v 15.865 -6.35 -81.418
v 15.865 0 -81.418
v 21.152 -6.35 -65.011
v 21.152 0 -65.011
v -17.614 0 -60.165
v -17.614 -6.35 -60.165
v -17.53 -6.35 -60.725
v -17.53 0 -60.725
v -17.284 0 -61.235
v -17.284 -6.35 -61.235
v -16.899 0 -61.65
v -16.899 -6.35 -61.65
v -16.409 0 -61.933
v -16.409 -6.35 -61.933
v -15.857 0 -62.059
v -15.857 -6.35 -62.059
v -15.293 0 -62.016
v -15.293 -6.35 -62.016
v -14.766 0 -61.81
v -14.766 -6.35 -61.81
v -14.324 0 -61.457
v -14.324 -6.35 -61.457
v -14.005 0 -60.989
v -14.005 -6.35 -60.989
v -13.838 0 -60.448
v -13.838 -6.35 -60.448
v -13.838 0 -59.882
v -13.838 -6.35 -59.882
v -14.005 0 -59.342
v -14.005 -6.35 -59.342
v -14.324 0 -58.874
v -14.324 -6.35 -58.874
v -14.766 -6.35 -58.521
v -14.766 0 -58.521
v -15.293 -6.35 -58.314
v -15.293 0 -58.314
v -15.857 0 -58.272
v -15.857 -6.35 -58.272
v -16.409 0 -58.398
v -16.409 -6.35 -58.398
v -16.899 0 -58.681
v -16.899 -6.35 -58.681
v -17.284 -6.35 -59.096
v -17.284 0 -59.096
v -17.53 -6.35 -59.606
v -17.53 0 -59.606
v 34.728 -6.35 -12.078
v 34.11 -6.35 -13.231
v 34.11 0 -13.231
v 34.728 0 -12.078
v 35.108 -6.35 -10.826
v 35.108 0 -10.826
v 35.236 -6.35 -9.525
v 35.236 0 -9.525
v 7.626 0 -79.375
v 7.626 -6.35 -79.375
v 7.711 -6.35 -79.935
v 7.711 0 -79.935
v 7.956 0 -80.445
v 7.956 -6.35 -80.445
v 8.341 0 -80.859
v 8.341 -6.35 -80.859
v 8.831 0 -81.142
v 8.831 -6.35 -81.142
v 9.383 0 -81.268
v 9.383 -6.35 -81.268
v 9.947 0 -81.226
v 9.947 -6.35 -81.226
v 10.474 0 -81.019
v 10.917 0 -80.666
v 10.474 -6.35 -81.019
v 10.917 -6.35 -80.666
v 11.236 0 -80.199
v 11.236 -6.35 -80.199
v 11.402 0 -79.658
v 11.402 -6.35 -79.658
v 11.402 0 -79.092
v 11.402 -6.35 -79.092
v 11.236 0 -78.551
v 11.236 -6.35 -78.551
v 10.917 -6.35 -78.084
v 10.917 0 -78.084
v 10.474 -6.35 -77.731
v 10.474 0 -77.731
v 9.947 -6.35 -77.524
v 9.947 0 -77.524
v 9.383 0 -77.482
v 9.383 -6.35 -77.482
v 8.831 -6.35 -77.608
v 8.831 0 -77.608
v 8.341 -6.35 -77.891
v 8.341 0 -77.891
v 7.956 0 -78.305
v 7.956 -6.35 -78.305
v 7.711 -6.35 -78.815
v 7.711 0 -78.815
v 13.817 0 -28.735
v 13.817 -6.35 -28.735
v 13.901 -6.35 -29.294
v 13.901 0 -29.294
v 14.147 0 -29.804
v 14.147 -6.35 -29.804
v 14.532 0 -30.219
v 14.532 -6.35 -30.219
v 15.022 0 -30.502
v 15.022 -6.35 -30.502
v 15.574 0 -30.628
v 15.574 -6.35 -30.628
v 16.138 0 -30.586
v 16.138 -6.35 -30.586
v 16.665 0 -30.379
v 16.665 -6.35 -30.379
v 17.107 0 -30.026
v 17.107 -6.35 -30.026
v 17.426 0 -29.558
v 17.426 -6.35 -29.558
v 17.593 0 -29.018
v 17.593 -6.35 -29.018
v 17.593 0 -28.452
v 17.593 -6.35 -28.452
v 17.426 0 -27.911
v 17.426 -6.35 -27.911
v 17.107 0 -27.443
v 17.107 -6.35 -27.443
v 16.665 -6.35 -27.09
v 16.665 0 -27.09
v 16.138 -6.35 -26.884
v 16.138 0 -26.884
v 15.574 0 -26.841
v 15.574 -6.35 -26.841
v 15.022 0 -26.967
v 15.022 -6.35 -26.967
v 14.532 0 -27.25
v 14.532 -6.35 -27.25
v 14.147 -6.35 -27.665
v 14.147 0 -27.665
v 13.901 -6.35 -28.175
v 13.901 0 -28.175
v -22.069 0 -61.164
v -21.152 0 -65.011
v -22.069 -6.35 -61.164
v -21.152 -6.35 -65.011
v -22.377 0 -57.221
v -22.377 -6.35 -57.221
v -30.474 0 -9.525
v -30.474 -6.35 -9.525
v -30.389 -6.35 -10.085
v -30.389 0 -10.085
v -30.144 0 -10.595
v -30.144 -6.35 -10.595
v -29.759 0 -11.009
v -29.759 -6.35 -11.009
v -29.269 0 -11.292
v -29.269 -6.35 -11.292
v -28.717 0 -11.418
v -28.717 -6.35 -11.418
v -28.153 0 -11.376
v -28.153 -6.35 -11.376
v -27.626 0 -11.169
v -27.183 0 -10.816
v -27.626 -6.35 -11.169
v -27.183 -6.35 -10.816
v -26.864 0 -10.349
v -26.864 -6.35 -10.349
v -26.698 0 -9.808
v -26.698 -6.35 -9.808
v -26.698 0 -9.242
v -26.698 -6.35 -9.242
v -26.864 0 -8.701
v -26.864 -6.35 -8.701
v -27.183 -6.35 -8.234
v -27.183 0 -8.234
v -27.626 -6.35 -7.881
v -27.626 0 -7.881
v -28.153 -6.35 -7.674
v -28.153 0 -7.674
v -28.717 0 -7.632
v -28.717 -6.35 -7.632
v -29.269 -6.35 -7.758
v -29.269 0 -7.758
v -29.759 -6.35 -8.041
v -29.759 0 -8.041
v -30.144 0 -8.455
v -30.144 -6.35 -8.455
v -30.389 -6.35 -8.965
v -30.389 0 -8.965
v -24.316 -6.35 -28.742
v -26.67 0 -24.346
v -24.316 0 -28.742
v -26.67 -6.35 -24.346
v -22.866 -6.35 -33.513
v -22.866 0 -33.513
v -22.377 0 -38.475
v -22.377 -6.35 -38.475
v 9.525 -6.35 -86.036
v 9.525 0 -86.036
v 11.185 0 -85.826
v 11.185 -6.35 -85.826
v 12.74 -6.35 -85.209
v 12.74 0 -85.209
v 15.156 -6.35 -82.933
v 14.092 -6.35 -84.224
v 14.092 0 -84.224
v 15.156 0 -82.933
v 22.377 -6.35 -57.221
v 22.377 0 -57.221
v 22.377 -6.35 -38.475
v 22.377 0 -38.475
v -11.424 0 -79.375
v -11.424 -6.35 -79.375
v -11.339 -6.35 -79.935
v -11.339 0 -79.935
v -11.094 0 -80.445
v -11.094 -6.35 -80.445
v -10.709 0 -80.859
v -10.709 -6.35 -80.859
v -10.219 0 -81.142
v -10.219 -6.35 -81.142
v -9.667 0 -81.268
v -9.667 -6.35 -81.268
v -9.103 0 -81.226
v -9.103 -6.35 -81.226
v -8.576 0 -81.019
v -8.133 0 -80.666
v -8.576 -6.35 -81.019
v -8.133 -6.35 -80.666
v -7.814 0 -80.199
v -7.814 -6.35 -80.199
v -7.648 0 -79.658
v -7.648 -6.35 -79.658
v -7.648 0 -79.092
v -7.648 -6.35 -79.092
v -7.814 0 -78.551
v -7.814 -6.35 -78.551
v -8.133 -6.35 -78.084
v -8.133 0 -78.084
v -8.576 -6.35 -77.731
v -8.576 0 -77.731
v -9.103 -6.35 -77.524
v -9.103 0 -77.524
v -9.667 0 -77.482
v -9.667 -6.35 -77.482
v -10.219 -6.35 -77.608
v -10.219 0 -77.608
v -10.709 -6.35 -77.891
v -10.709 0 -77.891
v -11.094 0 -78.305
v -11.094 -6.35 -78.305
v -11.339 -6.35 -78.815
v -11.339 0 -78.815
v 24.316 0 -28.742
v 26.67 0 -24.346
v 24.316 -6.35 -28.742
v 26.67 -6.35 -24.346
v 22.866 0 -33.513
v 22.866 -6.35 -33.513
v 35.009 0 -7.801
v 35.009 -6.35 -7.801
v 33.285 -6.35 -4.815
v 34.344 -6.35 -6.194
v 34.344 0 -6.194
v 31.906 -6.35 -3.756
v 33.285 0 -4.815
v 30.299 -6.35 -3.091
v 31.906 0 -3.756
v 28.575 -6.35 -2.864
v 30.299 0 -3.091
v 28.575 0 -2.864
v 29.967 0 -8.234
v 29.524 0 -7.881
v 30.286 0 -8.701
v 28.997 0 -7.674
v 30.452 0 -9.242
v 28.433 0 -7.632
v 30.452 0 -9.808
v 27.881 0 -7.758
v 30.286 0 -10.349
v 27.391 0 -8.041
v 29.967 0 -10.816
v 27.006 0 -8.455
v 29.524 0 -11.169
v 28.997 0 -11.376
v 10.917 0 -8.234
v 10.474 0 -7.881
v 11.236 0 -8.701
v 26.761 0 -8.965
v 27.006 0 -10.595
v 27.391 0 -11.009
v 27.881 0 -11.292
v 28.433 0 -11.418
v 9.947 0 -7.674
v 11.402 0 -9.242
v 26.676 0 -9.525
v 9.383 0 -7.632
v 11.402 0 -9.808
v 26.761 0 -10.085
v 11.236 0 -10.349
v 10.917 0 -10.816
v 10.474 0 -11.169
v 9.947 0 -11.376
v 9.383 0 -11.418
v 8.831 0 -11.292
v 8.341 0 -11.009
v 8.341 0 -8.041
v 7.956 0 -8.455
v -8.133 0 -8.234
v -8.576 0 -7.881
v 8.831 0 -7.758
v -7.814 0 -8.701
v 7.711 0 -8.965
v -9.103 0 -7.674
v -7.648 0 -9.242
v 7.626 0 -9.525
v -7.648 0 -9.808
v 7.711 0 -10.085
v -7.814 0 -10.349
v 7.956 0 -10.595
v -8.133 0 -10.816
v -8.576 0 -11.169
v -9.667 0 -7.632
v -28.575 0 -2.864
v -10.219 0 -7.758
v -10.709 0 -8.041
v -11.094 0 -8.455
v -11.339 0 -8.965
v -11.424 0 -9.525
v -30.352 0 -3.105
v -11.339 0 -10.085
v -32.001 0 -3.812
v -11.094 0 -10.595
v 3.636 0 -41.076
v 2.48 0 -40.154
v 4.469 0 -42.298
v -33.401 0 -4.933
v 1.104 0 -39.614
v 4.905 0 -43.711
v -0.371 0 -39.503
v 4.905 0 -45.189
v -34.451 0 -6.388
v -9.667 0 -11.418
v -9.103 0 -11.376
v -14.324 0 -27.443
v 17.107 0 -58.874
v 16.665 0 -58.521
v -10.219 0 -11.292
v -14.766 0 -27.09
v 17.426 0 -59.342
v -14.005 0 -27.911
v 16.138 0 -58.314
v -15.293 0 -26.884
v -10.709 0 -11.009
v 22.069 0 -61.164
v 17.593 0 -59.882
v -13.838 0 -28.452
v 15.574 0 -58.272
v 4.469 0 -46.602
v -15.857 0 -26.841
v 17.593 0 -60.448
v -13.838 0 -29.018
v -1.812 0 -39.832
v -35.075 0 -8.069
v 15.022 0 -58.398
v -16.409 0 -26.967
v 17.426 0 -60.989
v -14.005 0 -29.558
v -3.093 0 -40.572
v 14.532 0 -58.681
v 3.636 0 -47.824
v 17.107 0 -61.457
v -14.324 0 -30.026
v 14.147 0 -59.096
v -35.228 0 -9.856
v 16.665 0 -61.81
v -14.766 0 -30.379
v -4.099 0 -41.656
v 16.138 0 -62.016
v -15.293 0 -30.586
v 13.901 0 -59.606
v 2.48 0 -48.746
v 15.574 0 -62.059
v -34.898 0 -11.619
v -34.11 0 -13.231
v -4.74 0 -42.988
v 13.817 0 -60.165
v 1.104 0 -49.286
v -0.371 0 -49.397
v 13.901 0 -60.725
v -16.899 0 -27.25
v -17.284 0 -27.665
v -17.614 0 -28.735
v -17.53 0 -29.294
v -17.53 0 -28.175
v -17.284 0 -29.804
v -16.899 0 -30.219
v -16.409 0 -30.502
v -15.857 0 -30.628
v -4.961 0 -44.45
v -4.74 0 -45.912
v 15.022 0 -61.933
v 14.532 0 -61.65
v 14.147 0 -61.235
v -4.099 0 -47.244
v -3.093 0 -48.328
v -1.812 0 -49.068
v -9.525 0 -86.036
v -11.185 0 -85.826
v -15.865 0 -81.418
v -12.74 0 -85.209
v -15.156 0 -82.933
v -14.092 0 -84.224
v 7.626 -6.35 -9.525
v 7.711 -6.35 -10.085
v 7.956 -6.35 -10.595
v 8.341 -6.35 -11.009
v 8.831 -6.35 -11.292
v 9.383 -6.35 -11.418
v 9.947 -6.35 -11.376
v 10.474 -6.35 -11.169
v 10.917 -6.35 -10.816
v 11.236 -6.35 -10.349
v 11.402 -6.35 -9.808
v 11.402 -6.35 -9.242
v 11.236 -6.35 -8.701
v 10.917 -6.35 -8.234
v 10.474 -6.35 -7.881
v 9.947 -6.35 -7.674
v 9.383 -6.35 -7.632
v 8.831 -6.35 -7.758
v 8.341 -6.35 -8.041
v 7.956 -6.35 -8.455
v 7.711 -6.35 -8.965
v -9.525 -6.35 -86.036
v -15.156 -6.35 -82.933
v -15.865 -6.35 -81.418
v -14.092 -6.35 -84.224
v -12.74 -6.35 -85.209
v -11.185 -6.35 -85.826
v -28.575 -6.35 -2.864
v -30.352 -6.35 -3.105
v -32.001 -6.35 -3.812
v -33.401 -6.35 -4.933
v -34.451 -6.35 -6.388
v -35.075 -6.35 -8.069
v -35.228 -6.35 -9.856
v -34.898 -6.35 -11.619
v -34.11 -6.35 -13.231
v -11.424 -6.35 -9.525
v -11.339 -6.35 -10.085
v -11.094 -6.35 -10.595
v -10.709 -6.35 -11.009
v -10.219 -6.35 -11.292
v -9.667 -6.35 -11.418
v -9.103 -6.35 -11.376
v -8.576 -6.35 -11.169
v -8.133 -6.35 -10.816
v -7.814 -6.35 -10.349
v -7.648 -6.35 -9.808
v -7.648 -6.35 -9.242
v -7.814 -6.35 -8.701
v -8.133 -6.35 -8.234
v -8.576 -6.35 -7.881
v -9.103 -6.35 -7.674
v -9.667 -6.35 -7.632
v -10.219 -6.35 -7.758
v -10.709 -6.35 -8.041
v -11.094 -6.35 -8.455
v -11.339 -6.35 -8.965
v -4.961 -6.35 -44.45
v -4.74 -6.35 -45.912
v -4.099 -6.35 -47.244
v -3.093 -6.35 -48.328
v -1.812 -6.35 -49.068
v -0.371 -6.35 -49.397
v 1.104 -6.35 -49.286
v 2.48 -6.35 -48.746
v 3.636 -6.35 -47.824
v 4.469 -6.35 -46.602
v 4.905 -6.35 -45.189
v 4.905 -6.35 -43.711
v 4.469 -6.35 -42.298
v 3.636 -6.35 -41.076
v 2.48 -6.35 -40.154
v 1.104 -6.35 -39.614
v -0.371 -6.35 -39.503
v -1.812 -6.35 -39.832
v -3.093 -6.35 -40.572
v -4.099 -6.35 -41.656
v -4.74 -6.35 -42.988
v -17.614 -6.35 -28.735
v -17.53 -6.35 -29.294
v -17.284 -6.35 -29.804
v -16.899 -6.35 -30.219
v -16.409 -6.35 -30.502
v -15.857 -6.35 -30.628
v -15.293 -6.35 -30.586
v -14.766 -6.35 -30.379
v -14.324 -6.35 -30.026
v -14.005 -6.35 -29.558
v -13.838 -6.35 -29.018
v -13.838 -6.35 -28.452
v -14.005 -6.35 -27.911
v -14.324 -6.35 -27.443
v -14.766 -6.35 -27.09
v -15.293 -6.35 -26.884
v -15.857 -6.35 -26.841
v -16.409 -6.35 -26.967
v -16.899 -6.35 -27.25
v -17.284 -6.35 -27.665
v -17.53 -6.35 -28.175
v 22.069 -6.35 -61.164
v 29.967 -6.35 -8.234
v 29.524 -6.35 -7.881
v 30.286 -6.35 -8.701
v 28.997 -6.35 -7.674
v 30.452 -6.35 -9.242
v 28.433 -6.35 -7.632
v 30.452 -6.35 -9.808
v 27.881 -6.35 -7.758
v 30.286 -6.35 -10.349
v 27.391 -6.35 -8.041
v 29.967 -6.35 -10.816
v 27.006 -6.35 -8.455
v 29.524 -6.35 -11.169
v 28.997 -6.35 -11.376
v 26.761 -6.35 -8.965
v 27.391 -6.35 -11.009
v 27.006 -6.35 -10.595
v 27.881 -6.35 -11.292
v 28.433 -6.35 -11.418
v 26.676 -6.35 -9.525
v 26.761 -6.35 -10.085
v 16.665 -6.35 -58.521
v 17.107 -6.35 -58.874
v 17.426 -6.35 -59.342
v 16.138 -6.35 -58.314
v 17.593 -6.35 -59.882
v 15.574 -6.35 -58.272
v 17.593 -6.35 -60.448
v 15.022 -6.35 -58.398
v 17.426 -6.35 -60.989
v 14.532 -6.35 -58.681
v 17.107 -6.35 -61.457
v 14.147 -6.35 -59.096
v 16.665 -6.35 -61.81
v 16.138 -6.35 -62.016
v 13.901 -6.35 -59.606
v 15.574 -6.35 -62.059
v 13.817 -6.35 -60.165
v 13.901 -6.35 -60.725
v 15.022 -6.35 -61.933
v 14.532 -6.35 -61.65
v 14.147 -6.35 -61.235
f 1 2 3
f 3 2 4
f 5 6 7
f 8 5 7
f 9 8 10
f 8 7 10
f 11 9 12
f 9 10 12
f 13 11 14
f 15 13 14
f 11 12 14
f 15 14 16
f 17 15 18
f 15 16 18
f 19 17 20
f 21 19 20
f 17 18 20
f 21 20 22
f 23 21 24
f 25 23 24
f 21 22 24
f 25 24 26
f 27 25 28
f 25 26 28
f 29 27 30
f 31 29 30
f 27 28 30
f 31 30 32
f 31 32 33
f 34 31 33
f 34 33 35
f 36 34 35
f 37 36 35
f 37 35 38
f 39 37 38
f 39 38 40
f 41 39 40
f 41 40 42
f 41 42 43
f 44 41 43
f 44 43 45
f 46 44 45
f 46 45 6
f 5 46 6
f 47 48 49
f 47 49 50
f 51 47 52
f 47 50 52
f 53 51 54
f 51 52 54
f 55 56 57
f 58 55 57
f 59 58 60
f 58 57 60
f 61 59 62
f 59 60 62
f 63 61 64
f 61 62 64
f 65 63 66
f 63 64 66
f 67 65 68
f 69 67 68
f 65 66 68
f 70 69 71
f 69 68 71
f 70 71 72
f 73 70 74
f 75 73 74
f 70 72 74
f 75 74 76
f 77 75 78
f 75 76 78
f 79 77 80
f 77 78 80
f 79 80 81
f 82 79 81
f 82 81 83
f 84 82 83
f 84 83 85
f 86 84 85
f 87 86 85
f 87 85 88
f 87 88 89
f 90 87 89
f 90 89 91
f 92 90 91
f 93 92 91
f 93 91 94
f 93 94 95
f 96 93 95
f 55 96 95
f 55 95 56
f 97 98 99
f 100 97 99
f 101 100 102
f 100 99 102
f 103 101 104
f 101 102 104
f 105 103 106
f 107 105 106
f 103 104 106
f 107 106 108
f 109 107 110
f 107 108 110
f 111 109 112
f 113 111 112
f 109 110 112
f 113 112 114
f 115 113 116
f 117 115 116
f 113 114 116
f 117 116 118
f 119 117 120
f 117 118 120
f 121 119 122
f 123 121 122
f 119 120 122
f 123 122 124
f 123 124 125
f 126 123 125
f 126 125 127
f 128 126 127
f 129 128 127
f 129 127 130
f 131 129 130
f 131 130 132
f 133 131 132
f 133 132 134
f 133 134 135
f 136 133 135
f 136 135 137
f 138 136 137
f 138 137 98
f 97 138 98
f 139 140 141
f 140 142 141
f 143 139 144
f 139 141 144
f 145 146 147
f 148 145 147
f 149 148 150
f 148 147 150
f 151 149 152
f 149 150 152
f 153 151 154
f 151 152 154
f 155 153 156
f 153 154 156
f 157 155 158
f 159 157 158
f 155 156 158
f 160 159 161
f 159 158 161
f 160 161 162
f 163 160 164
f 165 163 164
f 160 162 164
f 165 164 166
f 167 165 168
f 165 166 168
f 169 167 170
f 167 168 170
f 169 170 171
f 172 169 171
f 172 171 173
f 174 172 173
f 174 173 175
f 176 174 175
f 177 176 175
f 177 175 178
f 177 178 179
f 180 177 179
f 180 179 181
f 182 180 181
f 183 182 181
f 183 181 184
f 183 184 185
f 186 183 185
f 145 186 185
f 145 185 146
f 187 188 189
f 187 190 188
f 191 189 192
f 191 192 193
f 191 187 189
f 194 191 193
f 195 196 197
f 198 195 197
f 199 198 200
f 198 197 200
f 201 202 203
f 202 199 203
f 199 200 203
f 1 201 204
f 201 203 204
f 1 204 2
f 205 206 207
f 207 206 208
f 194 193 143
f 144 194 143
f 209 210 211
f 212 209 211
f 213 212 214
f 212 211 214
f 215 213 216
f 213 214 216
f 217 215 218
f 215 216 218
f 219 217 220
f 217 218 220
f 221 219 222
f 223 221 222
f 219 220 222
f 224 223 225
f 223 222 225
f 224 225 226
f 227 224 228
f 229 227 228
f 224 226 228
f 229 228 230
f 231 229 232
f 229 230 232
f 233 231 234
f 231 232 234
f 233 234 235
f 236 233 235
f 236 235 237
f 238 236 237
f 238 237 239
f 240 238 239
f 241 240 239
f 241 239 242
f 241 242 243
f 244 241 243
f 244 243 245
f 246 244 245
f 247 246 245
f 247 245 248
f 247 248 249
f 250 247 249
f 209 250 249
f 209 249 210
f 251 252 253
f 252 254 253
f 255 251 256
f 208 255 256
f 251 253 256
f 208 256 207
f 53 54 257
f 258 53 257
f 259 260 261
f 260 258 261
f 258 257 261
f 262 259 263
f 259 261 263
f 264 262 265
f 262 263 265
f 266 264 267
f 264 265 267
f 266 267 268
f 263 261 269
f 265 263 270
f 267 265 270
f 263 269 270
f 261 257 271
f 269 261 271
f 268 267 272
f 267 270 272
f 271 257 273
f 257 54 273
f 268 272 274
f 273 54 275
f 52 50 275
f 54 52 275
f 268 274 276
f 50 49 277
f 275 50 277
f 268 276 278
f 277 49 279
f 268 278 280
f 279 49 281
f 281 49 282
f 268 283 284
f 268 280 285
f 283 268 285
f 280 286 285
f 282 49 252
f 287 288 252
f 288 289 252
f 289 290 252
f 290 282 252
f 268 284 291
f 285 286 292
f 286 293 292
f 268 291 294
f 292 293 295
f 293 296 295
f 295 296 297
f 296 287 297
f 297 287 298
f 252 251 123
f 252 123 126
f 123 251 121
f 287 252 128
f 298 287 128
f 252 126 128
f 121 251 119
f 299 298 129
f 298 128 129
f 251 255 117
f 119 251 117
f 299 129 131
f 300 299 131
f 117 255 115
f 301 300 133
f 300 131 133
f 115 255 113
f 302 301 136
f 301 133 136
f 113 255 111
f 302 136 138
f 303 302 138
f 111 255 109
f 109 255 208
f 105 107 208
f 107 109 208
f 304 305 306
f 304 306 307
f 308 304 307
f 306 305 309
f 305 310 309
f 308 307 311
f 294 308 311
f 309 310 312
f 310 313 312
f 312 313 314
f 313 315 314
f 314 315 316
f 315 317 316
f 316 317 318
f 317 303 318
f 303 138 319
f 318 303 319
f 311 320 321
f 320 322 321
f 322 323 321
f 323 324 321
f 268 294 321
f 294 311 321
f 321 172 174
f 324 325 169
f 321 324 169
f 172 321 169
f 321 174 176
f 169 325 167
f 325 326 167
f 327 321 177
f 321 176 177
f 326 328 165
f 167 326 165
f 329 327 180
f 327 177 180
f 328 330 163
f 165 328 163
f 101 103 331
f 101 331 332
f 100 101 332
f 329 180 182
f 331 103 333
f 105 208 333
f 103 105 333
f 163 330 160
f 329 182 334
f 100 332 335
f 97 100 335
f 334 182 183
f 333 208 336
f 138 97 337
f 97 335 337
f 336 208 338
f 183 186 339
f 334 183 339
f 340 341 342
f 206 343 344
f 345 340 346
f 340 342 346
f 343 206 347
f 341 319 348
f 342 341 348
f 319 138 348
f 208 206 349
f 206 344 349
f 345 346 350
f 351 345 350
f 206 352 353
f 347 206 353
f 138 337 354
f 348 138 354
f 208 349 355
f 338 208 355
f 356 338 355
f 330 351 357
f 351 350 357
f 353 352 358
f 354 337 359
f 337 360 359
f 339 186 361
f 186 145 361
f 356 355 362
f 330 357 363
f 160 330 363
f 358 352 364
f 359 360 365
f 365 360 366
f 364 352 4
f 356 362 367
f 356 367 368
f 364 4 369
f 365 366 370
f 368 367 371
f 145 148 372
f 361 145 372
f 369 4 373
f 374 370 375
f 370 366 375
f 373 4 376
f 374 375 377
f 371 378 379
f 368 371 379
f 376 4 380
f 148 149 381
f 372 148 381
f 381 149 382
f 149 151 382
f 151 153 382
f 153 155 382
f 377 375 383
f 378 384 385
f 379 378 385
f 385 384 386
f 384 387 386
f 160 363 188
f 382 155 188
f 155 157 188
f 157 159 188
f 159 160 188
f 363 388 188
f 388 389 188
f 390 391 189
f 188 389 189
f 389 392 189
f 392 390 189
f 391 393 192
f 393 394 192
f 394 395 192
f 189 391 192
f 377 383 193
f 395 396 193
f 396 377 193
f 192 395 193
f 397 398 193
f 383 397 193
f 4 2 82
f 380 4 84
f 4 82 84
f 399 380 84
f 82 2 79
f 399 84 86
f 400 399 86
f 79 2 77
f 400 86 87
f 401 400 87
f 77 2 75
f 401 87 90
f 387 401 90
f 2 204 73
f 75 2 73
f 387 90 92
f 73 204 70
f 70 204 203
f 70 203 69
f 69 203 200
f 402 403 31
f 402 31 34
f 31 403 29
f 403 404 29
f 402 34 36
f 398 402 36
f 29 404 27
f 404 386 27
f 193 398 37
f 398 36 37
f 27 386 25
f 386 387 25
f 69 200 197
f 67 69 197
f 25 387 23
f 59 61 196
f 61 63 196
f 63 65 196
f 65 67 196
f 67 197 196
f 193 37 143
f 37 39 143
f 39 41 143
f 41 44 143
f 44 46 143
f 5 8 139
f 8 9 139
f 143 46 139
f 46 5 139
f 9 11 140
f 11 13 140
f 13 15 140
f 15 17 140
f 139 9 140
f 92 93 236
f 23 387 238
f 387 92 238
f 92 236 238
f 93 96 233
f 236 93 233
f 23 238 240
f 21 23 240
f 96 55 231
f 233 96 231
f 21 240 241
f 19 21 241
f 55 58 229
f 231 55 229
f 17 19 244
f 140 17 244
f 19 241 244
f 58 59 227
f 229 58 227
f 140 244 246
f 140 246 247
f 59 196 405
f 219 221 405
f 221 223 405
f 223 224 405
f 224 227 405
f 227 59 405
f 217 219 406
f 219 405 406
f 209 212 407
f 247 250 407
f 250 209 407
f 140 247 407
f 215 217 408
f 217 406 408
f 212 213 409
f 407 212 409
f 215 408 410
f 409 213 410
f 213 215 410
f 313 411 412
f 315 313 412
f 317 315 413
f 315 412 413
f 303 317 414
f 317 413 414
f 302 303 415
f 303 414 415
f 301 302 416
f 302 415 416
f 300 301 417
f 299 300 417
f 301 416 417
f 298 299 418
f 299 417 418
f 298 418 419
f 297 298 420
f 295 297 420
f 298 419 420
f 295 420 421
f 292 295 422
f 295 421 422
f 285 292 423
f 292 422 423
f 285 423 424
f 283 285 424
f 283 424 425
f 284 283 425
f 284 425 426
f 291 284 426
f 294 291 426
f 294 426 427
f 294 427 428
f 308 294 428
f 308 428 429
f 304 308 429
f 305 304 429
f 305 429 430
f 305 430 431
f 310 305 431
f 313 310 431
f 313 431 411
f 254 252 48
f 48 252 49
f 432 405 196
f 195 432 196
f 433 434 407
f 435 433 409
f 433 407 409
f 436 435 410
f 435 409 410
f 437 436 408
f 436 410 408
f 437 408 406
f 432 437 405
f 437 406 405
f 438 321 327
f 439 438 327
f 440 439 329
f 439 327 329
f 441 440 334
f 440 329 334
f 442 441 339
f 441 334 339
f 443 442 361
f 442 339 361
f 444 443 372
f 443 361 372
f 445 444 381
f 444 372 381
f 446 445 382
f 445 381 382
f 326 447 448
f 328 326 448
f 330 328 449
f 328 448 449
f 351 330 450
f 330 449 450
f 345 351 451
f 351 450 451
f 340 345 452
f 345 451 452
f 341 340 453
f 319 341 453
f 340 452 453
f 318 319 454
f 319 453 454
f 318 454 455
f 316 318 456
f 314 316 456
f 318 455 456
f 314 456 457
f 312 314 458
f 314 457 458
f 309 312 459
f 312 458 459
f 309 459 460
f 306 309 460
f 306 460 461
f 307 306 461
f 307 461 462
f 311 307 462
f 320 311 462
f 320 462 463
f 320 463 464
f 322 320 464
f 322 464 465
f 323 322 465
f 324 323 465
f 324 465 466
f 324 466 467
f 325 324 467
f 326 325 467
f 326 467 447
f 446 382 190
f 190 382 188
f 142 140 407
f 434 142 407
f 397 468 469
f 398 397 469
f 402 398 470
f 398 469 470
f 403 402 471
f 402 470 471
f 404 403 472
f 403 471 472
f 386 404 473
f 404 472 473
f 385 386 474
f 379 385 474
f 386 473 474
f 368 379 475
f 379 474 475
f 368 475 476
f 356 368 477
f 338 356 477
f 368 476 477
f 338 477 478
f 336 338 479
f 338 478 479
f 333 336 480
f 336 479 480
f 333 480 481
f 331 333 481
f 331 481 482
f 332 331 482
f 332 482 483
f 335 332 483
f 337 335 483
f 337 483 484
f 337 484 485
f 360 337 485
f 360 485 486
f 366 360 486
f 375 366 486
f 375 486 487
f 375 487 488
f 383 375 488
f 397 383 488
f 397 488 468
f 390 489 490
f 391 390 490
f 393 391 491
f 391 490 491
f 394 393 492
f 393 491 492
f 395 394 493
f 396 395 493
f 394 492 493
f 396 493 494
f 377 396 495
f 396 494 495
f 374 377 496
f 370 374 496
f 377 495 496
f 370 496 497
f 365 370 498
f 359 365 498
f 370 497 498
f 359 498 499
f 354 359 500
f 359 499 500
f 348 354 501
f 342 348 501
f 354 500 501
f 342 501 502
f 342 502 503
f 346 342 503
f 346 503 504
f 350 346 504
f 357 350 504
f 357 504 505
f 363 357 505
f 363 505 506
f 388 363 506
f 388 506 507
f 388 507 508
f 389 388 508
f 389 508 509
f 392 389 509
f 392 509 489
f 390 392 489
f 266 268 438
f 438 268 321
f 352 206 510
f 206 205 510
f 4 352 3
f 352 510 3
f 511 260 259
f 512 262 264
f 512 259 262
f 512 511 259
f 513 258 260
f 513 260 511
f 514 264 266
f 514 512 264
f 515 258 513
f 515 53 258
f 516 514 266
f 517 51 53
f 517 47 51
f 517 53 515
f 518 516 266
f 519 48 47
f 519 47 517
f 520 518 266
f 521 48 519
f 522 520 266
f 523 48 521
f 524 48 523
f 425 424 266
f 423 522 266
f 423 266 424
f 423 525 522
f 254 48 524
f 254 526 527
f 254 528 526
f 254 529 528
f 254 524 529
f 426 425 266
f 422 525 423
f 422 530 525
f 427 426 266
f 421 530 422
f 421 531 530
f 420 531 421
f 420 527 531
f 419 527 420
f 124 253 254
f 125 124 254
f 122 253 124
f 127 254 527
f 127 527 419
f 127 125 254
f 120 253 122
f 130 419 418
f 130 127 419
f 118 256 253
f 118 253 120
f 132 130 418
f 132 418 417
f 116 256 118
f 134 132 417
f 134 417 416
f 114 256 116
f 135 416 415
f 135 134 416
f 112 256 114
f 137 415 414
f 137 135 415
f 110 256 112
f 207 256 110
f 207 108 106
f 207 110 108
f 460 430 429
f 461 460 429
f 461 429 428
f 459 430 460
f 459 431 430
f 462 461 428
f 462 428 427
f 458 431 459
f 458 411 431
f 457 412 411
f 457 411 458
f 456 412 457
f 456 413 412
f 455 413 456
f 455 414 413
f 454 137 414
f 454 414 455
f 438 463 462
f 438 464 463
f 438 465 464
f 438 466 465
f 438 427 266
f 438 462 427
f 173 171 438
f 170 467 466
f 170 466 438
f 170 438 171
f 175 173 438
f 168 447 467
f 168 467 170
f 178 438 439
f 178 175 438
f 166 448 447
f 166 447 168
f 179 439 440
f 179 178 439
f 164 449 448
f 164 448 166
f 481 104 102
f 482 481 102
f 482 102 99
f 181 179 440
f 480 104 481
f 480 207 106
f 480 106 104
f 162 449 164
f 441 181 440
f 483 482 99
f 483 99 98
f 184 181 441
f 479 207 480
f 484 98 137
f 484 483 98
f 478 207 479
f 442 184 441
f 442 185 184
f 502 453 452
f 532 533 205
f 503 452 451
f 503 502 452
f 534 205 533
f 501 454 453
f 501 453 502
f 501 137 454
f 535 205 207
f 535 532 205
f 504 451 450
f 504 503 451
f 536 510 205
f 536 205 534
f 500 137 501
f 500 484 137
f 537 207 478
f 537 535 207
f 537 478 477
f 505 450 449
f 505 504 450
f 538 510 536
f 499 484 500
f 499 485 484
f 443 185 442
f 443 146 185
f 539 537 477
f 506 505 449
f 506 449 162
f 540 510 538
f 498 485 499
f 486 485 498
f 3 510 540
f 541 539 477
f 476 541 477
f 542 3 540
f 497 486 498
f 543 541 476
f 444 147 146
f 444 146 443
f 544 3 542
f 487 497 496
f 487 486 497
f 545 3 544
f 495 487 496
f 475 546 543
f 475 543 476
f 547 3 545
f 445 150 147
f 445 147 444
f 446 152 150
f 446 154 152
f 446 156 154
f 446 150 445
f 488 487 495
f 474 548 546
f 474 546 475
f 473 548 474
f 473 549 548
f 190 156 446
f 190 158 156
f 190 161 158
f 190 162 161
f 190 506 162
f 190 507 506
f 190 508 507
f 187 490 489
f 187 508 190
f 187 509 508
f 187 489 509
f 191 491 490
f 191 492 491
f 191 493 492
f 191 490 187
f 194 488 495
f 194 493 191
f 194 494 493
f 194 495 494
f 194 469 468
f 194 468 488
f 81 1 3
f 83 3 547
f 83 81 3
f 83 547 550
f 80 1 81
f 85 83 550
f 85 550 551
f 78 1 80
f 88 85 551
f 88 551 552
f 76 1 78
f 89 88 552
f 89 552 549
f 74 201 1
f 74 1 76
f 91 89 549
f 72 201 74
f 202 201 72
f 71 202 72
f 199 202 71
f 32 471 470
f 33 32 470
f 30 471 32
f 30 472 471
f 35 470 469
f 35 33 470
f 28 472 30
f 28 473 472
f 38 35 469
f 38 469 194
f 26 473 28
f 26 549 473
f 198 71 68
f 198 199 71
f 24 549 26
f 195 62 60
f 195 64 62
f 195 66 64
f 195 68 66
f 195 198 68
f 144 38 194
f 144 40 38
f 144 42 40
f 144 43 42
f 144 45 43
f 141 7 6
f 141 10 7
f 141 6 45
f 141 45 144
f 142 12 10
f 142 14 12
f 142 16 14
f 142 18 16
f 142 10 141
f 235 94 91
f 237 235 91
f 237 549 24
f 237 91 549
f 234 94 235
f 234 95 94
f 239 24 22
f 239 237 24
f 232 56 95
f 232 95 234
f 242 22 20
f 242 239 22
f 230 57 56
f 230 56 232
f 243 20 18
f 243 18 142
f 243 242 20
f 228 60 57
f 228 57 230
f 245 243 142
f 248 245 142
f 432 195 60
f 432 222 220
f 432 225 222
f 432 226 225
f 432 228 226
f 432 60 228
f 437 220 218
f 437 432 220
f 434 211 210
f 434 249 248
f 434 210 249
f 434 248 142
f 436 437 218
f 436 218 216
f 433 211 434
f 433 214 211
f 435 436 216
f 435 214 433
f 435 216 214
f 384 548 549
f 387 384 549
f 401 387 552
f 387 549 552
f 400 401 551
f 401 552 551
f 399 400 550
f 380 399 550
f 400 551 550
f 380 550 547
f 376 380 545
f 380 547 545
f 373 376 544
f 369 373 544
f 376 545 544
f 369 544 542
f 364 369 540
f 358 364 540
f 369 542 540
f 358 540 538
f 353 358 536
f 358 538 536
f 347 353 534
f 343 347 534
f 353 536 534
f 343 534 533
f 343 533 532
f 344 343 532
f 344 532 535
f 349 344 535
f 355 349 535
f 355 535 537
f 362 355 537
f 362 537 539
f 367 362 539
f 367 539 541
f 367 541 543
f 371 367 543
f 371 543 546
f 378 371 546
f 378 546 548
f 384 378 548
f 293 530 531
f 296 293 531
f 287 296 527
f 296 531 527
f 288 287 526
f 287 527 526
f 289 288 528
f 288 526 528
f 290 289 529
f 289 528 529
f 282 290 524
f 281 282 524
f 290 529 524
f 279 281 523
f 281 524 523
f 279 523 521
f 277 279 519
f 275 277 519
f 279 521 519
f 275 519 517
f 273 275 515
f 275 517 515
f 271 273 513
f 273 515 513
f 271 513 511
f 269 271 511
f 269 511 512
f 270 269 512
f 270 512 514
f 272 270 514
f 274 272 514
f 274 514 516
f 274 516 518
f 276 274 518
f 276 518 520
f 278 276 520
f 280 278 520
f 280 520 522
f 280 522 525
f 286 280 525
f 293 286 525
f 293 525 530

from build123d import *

# Parameters (mm, degrees)
BOSS_EXTRUDE1_DEPTH       = 6.35
F_6_CLEARANCE_HOLE1_D     = 3.7973
FILLET1_R                 = 17.78
F_7_16_20_TAPPED_HOLE1_D  = 9.92124
F_6_CLEARANCE_HOLE2_D     = 3.7973
F_6_CLEARANCE_HOLE2_DEPTH = 6.35
CUT_EXTRUDE1_DEPTH        = 7.35
FILLET2_R                 = 25.4


with BuildPart() as part:
    # Sketch1 → Boss-Extrude1 (new body)
    with BuildSketch(Plane(origin=(0, 0, 0), x_dir=(1, 0, 0), z_dir=(0, 1, 0))):
        Polygon((-57.15, 0), (0, 114.3), (57.15, 0), align=None)
    extrude(amount=-BOSS_EXTRUDE1_DEPTH)

    # #6 Clearance Hole1 (through all)
    with Locations(Plane(origin=(0, 0, 0), x_dir=(1, 0, 0), z_dir=(0, 1, 0))):
        with Locations((28.575, 9.525), (9.525, 9.525), (-9.525, 79.375), (9.525, 79.375), (-28.575, 9.525), (-9.525, 9.525)):
            Hole(F_6_CLEARANCE_HOLE1_D / 2)

    # Fillet1
    fillet1_edges = [part.edges().sort_by_distance(p)[0] for p in [
        (-57.15, -3.175, 0),
        (0, -3.175, -114.3),
        (57.15, -3.175, 0),
    ]]
    fillet(fillet1_edges, radius=FILLET1_R)

    # 7/16-20 Tapped Hole1 (through all)
    with Locations(Plane(origin=(0, 0, 0), x_dir=(1, 0, 0), z_dir=(0, 1, 0))):
        with Locations((0, 44.45)):
            Hole(F_7_16_20_TAPPED_HOLE1_D / 2)

    # #6 Clearance Hole2
    with Locations(Plane(origin=(0, 0, 0), x_dir=(1, 0, 0), z_dir=(0, 1, 0))):
        with Locations((-15.715448212, 60.165448212), (15.715448212, 28.734551788), (-15.715448212, 28.734551788), (15.715448212, 60.165448212)):
            Hole(F_6_CLEARANCE_HOLE2_D / 2, depth=F_6_CLEARANCE_HOLE2_DEPTH)

    # Sketch9 → Cut-Extrude1 (cut, through all)
    with BuildSketch(Plane(origin=(0, 0, 0), x_dir=(1, 0, 0), z_dir=(0, 1, 0))):
        with BuildLine():
            ThreePointArc((15.902915456, 82.494169088), (0, 92.32271136), (-15.902915456, 82.494169088))
            Line((-15.902915456, 82.494169088), (-44.284271136, 25.731457728))
            ThreePointArc((-44.284271136, 25.731457728), (-43.505927053, 8.432500827), (-28.38135568, 0))
            Line((-28.38135568, 0), (28.38135568, 0))
            ThreePointArc((28.38135568, 0), (43.505927053, 8.432500827), (44.284271136, 25.731457728))
            Line((44.284271136, 25.731457728), (15.902915456, 82.494169088))
        make_face()
        with BuildLine():
            Line((-22.376598212, 60.165448212), (-22.376598212, 61.212248927))
            Line((-22.376598212, 61.212248927), (-22.055517914, 62.208591744))
            Line((-22.055517914, 62.208591744), (-15.865069677, 81.41814361))
            ThreePointArc((-15.865069677, 81.41814361), (-13.446812927, 84.759264359), (-9.525, 86.03615))
            Line((-9.525, 86.03615), (9.525, 86.03615))
            ThreePointArc((9.525, 86.03615), (13.446812927, 84.759264359), (15.865069677, 81.41814361))
            Line((15.865069677, 81.41814361), (22.055518291, 62.208590573))
            Line((22.055518291, 62.208590573), (22.376598212, 61.212248927))
            Line((22.376598212, 61.212248927), (22.376598212, 60.165448212))
            Line((22.376598212, 60.165448212), (22.376598212, 30.758347904))
            Line((22.376598212, 30.758347904), (34.110328487, 13.230544207))
            ThreePointArc((34.110328487, 13.230544207), (34.948483062, 11.461396908), (35.23615, 9.525))
            ThreePointArc((35.23615, 9.525), (33.285144336, 4.814855664), (28.575, 2.86385))
            Line((28.575, 2.86385), (9.525000022, 2.86385))
            Line((9.525000022, 2.86385), (-9.525, 2.86385))
            Line((-9.525, 2.86385), (-28.575, 2.86385))
            ThreePointArc((-28.575, 2.86385), (-34.450972478, 6.387506292), (-34.110328487, 13.230544207))
            Line((-34.110328487, 13.230544207), (-22.376598212, 30.758347904))
            Line((-22.376598212, 30.758347904), (-22.376598212, 60.165448212))
        make_face(mode=Mode.SUBTRACT)
    extrude(amount=-CUT_EXTRUDE1_DEPTH, mode=Mode.SUBTRACT)

    # Fillet2
    fillet2_edges = [part.edges().sort_by_distance(p)[0] for p in [
        (22.376598212, -3.175, -30.758347904),
        (22.376598212, -3.175, -61.212248927),
        (-22.376598212, -3.175, -61.212248927),
        (-22.376598212, -3.175, -30.758347904),
    ]]
    fillet(fillet2_edges, radius=FILLET2_R)


solid = part.part
